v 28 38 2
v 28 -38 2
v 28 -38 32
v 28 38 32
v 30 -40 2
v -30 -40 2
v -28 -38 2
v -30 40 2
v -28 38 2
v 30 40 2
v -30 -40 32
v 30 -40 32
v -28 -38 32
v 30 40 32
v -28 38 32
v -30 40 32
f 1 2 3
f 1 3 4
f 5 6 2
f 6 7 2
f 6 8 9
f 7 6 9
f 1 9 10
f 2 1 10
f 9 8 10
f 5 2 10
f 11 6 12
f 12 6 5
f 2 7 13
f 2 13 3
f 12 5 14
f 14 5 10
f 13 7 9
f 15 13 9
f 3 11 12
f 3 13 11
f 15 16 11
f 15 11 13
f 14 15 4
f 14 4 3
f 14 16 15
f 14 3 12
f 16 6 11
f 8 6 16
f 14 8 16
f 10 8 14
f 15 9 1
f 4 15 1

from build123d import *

# Parameters (mm, degrees)
SKETCH001_W   = 60
SKETCH001_H   = 80
SKETCH001_W_2 = 56
SKETCH001_H_2 = 76
PAD_DEPTH     = 30


with BuildPart() as part:
    # Sketch001 → Pad (new body)
    with BuildSketch(Plane.XY.offset(2)):
        Rectangle(SKETCH001_W, SKETCH001_H)
        Rectangle(SKETCH001_W_2, SKETCH001_H_2, mode=Mode.SUBTRACT)
    extrude(amount=PAD_DEPTH)


solid = part.part
